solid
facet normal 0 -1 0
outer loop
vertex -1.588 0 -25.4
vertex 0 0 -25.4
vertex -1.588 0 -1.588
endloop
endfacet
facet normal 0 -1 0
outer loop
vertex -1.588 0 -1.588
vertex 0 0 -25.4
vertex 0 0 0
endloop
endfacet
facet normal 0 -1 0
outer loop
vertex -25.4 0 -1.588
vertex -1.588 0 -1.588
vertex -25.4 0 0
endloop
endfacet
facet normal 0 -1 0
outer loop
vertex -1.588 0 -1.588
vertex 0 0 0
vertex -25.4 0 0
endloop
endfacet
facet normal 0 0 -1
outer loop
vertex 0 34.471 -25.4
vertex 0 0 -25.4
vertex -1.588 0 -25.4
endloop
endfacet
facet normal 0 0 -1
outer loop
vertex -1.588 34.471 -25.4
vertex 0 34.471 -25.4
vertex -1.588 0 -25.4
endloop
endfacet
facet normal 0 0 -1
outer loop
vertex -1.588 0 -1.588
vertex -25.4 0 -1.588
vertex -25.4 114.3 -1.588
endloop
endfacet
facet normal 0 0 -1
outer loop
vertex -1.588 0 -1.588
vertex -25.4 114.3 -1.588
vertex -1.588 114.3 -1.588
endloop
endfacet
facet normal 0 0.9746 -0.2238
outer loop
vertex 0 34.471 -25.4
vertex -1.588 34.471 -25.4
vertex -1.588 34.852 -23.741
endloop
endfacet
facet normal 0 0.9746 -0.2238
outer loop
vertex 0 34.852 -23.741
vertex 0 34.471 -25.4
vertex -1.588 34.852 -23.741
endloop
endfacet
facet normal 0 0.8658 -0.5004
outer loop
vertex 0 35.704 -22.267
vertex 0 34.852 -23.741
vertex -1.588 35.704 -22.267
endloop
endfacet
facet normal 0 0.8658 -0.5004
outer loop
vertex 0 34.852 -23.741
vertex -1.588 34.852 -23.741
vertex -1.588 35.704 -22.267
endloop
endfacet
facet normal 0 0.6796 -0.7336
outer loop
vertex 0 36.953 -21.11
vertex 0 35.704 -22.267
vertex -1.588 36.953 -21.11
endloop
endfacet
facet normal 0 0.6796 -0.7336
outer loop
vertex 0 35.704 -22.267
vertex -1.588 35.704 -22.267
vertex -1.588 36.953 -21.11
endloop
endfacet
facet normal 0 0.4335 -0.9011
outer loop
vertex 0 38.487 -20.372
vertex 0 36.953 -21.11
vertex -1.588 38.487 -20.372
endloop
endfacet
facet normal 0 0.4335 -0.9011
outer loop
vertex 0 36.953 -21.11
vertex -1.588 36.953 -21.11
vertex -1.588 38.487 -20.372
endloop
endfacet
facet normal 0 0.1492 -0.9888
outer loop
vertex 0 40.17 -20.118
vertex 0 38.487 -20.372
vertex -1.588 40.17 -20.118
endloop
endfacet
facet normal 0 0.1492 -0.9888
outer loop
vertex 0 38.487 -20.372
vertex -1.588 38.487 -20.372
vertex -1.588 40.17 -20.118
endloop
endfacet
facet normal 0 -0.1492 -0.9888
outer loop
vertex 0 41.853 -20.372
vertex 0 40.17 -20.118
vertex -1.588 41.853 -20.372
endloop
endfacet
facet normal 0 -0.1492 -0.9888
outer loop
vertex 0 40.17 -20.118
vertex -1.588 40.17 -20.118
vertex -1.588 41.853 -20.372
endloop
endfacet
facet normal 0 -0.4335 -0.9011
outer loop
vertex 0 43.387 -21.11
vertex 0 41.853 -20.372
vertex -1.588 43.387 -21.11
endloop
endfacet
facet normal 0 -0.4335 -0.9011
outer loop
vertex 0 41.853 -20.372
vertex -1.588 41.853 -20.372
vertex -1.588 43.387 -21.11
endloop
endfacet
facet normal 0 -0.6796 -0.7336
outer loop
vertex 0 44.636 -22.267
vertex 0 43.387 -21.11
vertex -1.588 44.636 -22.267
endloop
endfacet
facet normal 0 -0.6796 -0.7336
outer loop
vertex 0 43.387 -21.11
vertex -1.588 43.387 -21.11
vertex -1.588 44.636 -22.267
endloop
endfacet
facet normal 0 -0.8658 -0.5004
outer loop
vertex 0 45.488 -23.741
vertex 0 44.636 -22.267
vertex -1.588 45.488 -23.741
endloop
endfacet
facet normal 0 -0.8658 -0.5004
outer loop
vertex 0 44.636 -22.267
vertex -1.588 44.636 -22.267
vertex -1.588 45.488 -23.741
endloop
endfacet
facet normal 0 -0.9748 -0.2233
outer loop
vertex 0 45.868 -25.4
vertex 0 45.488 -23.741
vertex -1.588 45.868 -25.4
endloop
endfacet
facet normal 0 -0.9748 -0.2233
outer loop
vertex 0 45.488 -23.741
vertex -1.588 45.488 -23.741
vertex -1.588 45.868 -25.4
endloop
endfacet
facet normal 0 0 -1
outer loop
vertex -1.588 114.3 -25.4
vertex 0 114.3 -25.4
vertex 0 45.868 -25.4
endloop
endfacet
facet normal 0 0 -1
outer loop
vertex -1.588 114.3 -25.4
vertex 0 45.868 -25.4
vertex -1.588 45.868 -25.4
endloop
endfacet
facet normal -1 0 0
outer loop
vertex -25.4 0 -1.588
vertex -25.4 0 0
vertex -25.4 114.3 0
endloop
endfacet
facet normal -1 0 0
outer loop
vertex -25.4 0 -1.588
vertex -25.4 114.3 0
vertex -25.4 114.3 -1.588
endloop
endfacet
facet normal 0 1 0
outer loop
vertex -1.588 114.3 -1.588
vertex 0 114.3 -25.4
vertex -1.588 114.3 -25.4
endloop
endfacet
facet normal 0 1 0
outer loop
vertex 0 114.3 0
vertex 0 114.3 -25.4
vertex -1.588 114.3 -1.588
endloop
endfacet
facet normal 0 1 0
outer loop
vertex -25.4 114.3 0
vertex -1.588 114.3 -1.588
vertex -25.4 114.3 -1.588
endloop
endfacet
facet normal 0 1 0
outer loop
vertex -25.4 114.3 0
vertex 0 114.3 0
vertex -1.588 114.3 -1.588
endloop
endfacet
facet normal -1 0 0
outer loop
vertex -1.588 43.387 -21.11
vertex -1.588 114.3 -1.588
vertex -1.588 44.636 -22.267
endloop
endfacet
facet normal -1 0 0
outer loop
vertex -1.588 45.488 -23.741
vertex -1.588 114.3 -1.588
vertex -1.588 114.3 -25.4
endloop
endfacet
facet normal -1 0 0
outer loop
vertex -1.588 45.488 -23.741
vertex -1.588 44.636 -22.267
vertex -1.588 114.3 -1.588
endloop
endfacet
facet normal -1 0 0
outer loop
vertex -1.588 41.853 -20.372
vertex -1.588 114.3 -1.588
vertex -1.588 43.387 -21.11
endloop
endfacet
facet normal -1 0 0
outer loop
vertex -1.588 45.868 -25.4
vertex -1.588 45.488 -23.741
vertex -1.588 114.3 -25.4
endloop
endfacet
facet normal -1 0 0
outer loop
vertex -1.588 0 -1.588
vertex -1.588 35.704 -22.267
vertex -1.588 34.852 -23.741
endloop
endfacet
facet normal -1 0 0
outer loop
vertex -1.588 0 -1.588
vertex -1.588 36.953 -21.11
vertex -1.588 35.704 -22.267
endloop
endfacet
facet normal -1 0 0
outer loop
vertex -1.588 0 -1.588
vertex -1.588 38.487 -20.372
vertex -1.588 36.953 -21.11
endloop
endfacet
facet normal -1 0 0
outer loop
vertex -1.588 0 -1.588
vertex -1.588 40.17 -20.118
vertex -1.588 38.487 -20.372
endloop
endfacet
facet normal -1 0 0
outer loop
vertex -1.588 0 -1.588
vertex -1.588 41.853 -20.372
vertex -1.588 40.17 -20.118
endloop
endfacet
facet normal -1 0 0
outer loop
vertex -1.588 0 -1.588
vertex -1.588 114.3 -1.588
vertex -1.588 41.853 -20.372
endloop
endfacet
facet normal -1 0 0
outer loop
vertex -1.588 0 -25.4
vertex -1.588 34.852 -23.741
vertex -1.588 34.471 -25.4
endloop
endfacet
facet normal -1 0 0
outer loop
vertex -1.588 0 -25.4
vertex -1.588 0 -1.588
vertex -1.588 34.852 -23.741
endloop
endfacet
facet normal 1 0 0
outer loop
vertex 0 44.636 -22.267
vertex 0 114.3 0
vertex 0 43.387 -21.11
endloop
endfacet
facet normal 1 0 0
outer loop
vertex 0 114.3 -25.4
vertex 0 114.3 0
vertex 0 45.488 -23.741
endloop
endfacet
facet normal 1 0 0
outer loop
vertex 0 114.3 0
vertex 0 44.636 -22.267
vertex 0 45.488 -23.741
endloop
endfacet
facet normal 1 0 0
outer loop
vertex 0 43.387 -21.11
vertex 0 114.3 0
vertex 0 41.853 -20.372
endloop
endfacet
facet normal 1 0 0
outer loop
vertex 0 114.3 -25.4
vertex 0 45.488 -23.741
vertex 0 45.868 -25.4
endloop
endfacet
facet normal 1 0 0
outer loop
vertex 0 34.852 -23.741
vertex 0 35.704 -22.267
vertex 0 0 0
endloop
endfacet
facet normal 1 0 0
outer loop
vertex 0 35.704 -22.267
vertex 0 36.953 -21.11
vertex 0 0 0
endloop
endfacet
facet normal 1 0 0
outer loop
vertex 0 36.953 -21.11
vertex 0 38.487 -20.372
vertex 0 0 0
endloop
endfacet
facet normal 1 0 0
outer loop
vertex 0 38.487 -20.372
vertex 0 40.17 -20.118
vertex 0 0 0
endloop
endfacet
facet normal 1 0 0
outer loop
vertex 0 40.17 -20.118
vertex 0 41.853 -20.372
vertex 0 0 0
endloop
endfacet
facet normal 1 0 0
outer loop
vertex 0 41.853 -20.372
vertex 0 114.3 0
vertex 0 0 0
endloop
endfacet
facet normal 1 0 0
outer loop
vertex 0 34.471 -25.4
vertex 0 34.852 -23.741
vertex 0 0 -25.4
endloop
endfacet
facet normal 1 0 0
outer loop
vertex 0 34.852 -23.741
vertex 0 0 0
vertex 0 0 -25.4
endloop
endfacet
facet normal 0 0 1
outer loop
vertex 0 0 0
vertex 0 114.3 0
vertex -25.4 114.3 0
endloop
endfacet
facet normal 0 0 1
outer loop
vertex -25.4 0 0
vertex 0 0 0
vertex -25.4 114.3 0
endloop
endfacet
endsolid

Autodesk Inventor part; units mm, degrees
ref_plane "YZ Plane" through (0, 0, 0) normal (1, 0, 0) x (0, 1, 0)
ref_plane "XZ Plane" through (0, 0, 0) normal (0, 1, 0) x (-1, 0, 0)
ref_plane "XY Plane" through (0, 0, 0) normal (0, 0, 1) x (1, 0, 0)
sketch "Sketch1" plane through (0, 0, 0) normal (0, 1, 0) x (-1, 0, 0)
  line L0 (0, 0) -> (0, -25.4)
  line L1 (0, -25.4) -> (1.5875, -25.4)
  line L2 (0, 0) -> (25.4, 0)
  line L3 (25.4, 0) -> (25.4, -1.5875)
  line L4 (25.4, -1.5875) -> (1.5875, -1.5875)
  line L5 (1.5875, -1.5875) -> (1.5875, -25.4)
  dimension "d0" = 25.4
  dimension "d1" = 1.5875
  dimension "d4" = 25.4
  dimension "d5" = 1.5875
extrude "Extrusion1" add sketch "Sketch1" along normal blind 114.3
sketch "Sketch2" plane through (-1.5875, 0, -25.4) normal (-1, 0, 0) x (0, 0, 1)
  circle A0 centre (-0.4334, 40.1699) radius 5.715 projected
  point P0 (25.4, 0)
extrude "Extrusion2" cut sketch "Sketch2" against normal blind 46.0375
properties part number "OTHER bracket for pickup"
